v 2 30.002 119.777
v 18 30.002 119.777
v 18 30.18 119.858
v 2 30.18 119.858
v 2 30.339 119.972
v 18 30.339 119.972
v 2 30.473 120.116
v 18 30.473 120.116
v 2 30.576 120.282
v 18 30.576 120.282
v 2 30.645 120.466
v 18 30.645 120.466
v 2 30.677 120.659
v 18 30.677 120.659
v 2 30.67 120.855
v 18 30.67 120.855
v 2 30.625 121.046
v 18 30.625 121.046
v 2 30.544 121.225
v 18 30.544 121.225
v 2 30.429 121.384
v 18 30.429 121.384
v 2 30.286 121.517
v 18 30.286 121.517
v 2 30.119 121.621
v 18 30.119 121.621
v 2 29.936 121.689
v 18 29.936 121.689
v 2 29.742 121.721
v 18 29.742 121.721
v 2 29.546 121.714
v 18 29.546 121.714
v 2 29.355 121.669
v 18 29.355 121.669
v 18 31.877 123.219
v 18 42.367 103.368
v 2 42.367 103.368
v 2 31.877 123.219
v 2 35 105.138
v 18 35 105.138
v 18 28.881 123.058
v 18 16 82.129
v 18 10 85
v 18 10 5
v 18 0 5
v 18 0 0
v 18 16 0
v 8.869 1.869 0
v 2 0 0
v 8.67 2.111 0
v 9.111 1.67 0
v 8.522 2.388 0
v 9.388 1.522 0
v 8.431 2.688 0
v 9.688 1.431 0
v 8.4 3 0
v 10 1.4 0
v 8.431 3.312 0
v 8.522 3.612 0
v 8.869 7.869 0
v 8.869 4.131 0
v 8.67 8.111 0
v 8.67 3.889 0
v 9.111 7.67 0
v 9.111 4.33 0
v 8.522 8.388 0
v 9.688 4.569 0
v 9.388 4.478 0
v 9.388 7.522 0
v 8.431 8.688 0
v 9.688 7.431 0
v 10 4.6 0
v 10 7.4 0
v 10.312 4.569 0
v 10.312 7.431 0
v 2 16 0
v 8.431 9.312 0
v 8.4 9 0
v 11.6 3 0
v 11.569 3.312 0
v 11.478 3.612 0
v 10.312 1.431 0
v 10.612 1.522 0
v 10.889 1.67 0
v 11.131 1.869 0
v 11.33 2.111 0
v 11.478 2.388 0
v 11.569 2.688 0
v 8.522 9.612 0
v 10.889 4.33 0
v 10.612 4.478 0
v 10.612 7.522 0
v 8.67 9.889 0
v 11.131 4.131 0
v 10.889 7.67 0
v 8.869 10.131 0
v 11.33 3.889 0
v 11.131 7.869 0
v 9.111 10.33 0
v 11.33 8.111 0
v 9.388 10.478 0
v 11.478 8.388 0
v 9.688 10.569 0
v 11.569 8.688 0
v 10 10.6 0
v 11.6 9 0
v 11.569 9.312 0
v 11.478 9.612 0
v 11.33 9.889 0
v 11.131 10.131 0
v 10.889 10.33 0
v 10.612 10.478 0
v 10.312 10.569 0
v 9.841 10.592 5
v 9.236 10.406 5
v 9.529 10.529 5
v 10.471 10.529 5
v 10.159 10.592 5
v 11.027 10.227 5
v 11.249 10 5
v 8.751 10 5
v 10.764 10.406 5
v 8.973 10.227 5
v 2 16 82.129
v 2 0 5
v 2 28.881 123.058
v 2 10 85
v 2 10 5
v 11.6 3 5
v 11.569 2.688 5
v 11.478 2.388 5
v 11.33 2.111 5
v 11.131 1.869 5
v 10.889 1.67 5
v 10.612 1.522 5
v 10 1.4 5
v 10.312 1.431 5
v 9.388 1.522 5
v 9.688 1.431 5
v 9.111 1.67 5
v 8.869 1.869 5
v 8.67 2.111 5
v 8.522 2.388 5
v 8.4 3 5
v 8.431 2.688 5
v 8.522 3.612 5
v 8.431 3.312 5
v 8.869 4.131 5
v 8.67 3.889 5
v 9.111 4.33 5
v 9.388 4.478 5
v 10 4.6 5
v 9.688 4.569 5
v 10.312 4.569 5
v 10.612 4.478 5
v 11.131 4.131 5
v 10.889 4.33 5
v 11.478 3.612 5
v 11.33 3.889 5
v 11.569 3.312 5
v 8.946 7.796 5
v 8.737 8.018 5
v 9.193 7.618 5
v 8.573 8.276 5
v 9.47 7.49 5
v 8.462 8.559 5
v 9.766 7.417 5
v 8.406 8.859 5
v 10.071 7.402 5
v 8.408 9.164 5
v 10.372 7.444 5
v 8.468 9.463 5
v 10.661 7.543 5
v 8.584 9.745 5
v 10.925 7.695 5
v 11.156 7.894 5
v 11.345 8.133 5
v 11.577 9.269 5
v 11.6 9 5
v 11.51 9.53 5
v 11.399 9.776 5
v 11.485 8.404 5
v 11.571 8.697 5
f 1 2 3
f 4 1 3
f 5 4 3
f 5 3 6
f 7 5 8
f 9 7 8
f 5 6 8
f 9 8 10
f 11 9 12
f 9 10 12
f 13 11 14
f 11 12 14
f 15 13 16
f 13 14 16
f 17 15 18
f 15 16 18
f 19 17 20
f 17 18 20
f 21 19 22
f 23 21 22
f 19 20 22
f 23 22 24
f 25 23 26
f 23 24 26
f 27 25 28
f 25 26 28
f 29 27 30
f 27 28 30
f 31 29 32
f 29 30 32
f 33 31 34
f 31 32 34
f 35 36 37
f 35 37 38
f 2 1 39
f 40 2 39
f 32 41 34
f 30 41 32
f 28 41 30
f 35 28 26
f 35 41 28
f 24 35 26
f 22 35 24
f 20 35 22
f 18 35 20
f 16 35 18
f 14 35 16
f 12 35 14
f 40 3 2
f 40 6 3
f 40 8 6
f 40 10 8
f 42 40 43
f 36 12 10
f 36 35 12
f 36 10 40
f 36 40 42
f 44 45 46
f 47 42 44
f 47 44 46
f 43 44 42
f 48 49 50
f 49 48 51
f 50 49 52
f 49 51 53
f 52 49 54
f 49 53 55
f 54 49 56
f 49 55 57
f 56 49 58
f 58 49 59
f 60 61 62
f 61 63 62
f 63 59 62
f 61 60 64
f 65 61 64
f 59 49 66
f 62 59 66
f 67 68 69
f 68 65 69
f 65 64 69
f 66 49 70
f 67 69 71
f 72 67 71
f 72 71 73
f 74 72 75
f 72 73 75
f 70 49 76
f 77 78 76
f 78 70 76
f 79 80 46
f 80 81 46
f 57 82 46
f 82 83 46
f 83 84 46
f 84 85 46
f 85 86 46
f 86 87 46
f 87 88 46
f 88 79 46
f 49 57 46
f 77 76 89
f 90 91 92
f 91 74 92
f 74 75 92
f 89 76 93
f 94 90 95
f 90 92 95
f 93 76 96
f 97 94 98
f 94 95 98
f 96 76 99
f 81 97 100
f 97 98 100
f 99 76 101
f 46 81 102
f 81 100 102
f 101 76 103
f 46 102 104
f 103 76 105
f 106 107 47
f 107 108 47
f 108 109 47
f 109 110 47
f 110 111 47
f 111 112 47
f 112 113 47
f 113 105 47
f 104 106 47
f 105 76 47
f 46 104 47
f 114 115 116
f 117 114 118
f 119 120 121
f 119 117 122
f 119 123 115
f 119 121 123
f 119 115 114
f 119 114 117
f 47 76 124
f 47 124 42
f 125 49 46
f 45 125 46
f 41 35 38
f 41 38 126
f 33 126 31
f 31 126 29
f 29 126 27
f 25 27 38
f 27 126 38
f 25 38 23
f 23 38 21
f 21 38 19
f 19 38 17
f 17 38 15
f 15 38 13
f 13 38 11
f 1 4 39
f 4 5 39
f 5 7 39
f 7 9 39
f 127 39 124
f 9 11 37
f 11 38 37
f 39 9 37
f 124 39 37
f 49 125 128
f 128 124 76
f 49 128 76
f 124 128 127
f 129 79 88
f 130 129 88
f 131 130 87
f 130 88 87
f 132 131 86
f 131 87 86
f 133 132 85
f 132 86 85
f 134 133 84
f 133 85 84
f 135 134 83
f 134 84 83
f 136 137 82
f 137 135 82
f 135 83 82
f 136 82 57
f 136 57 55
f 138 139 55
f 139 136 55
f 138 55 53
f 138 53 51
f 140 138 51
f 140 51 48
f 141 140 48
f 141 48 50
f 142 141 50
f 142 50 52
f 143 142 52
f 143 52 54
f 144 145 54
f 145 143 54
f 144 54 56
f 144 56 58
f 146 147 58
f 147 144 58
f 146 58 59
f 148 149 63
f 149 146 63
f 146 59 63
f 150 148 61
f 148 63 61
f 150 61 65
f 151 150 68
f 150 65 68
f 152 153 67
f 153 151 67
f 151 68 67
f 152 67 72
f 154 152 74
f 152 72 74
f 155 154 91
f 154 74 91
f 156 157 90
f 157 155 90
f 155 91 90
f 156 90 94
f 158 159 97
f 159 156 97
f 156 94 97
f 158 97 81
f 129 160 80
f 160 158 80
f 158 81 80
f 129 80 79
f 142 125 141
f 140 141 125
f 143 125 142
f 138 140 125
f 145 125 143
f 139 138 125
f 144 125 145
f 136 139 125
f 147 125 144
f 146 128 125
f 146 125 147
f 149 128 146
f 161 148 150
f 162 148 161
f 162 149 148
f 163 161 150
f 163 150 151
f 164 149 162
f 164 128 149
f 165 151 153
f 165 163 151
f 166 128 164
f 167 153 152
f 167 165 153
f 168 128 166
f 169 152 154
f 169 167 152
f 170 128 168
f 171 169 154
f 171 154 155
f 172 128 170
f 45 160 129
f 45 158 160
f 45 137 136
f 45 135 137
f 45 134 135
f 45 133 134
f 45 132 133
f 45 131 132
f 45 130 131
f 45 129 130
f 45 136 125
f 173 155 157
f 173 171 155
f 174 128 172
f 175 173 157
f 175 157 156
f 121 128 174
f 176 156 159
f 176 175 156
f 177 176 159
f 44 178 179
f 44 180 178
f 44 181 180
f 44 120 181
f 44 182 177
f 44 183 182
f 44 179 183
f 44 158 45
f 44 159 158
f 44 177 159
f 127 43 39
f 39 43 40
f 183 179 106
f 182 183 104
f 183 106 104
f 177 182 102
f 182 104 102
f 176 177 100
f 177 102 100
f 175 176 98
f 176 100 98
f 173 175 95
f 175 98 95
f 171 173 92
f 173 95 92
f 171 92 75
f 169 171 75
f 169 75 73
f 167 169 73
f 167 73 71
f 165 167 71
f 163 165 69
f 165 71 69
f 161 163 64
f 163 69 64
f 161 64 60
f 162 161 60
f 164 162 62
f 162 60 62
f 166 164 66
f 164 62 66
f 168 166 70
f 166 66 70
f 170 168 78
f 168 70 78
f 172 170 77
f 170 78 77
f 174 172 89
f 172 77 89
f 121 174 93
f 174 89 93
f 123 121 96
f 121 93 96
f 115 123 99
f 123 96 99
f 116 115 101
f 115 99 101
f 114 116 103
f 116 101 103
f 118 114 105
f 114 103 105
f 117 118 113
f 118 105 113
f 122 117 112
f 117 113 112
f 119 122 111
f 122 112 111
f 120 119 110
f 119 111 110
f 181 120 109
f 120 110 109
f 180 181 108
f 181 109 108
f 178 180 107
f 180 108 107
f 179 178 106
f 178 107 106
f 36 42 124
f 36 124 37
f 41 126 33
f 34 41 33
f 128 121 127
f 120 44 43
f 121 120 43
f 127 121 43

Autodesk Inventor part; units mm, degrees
ref_plane "YZ Plane" through (0, 0, 0) normal (1, 0, 0) x (0, 1, 0)
ref_plane "XZ Plane" through (0, 0, 0) normal (0, 1, 0) x (-1, 0, 0)
ref_plane "XY Plane" through (0, 0, 0) normal (0, 0, 1) x (1, 0, 0)
ref_plane "Arbeitsebene1" through (0, 10.2818, 0) normal (0, 0, 1) x (1, 0, 0)
sketch "Skizze1" plane through (0, 10.2818, 0) normal (0, 0, 1) x (1, 0, 0)
  circle A0 centre (10, 10.7182) radius 1.4 projected
  circle A1 centre (10, 4.7182) radius 1.4 projected
  circle A2 centre (10, -1.2818) radius 1.4 projected
  circle A3 centre (10, -7.2818) radius 1.4 projected
  line L0 (0, 12.7182) -> (2, 14.7182) projected
  line L1 (0, -8.2818) -> (0, 12.7182) projected
  line L2 (2, -10.2818) -> (0, -8.2818) projected
  line L3 (2, -10.2818) -> (18, -10.2818) projected
  line L4 (20, -8.2818) -> (18, -10.2818) projected
  line L5 (20, -8.2818) -> (20, 12.7182) projected
  line L6 (18, 14.7182) -> (20, 12.7182) projected
  line L7 (2, 14.7182) -> (18, 14.7182) projected
  line L8 (18, -10.2818) -> (2, -10.2818)
  line L9 (2, -10.2818) -> (2, 5.7182)
  line L10 (2, 5.7182) -> (18, 5.7182)
  line L11 (18, 5.7182) -> (18, -10.2818)
  circle A4 centre (10, -1.2818) radius 1.6
  circle A5 centre (10, -7.2818) radius 1.6
  point P0 (0, -10.2818)
  point P1 (2, -10.2818)
  dimension "d0" = 16
  dimension "d1" = 3.2
  dimension "d2" = 3.2
extrude "Extrusion1" add sketch "Skizze1" along normal blind 5 contours A1 L10 | A1 L10 L11 L3 L9 picked at (10.1558, 4.945)
sketch "Skizze2" plane through (18, 0, 0) normal (1, 0, 0) x (0, 0, -1)
  line L0 (0, 0) -> (0, 16) projected
  line L1 (0, 16) -> (-5, 16) projected
  line L2 (-5, 0) -> (-5, 16) projected
  line L3 (0, 0) -> (-5, 0) projected
  line L4 (-5, 16) -> (100, 16) construction
  line L5 (-103.3677, 42.3666) -> (-123.2187, 31.877)
  line L6 (-123.2187, 31.877) -> (-123.0578, 28.8814)
  line L7 (-123.0578, 28.8814) -> (-105.1383, 35)
  line L8 (-5, 10) -> (-85, 10)
  line L9 (-85, 10) -> (-105.1383, 35)
  line L10 (-5, 16) -> (-82.1287, 16)
  line L11 (-82.1287, 16) -> (-103.3677, 42.3666)
  point P0 (0, 0)
  point P1 (-123.1383, 30.3792)
  dimension "d8" = 3
  dimension "d9" = 6
  dimension "d15" = 80
  dimension "d16" = 6
  dimension "d17" = 9
  dimension "d18" = 110
  dimension "d19" = 18
  dimension "d20" = 25
extrude "Extrusion2" add sketch "Skizze2" against normal up to surface (16 mm away) contours L2 L8 L9 L7 L6 L5 L11 L10
sketch "Skizze3" plane through (18, 0, 0) normal (1, 0, 0) x (0, 0, -1)
  line L0 (0, 0) -> (0, 16) projected
  line L1 (0, 16) -> (-82.1287, 16) projected
  line L2 (-103.3677, 42.3666) -> (-123.2187, 31.877) projected
  line L3 (-123.2187, 31.877) -> (-123.0578, 28.8814) projected
  line L4 (-123.0578, 28.8814) -> (-105.1383, 35) projected
  line L5 (-5, 0) -> (-5, 10) projected
  line L6 (0, 0) -> (-5, 0) projected
  circle A0 centre (-120.723, 29.6786) radius 1
  line L7 (-82.1287, 16) -> (-103.3677, 42.3666) projected
  line L8 (-105.1383, 35) -> (-85, 10) projected
  line L9 (-85, 10) -> (-5, 10) projected
  point P0 (0, 0)
  point P1 (-119.7766, 30.0017)
  point P2 (-121.6693, 29.3555)
  dimension "d12" = 2
extrude "Extrusion3" cut sketch "Skizze3" against normal through all contours L4 A0 picked at (-121.0524, 29.7298)
properties part number "OT2-Gripper_finger"
